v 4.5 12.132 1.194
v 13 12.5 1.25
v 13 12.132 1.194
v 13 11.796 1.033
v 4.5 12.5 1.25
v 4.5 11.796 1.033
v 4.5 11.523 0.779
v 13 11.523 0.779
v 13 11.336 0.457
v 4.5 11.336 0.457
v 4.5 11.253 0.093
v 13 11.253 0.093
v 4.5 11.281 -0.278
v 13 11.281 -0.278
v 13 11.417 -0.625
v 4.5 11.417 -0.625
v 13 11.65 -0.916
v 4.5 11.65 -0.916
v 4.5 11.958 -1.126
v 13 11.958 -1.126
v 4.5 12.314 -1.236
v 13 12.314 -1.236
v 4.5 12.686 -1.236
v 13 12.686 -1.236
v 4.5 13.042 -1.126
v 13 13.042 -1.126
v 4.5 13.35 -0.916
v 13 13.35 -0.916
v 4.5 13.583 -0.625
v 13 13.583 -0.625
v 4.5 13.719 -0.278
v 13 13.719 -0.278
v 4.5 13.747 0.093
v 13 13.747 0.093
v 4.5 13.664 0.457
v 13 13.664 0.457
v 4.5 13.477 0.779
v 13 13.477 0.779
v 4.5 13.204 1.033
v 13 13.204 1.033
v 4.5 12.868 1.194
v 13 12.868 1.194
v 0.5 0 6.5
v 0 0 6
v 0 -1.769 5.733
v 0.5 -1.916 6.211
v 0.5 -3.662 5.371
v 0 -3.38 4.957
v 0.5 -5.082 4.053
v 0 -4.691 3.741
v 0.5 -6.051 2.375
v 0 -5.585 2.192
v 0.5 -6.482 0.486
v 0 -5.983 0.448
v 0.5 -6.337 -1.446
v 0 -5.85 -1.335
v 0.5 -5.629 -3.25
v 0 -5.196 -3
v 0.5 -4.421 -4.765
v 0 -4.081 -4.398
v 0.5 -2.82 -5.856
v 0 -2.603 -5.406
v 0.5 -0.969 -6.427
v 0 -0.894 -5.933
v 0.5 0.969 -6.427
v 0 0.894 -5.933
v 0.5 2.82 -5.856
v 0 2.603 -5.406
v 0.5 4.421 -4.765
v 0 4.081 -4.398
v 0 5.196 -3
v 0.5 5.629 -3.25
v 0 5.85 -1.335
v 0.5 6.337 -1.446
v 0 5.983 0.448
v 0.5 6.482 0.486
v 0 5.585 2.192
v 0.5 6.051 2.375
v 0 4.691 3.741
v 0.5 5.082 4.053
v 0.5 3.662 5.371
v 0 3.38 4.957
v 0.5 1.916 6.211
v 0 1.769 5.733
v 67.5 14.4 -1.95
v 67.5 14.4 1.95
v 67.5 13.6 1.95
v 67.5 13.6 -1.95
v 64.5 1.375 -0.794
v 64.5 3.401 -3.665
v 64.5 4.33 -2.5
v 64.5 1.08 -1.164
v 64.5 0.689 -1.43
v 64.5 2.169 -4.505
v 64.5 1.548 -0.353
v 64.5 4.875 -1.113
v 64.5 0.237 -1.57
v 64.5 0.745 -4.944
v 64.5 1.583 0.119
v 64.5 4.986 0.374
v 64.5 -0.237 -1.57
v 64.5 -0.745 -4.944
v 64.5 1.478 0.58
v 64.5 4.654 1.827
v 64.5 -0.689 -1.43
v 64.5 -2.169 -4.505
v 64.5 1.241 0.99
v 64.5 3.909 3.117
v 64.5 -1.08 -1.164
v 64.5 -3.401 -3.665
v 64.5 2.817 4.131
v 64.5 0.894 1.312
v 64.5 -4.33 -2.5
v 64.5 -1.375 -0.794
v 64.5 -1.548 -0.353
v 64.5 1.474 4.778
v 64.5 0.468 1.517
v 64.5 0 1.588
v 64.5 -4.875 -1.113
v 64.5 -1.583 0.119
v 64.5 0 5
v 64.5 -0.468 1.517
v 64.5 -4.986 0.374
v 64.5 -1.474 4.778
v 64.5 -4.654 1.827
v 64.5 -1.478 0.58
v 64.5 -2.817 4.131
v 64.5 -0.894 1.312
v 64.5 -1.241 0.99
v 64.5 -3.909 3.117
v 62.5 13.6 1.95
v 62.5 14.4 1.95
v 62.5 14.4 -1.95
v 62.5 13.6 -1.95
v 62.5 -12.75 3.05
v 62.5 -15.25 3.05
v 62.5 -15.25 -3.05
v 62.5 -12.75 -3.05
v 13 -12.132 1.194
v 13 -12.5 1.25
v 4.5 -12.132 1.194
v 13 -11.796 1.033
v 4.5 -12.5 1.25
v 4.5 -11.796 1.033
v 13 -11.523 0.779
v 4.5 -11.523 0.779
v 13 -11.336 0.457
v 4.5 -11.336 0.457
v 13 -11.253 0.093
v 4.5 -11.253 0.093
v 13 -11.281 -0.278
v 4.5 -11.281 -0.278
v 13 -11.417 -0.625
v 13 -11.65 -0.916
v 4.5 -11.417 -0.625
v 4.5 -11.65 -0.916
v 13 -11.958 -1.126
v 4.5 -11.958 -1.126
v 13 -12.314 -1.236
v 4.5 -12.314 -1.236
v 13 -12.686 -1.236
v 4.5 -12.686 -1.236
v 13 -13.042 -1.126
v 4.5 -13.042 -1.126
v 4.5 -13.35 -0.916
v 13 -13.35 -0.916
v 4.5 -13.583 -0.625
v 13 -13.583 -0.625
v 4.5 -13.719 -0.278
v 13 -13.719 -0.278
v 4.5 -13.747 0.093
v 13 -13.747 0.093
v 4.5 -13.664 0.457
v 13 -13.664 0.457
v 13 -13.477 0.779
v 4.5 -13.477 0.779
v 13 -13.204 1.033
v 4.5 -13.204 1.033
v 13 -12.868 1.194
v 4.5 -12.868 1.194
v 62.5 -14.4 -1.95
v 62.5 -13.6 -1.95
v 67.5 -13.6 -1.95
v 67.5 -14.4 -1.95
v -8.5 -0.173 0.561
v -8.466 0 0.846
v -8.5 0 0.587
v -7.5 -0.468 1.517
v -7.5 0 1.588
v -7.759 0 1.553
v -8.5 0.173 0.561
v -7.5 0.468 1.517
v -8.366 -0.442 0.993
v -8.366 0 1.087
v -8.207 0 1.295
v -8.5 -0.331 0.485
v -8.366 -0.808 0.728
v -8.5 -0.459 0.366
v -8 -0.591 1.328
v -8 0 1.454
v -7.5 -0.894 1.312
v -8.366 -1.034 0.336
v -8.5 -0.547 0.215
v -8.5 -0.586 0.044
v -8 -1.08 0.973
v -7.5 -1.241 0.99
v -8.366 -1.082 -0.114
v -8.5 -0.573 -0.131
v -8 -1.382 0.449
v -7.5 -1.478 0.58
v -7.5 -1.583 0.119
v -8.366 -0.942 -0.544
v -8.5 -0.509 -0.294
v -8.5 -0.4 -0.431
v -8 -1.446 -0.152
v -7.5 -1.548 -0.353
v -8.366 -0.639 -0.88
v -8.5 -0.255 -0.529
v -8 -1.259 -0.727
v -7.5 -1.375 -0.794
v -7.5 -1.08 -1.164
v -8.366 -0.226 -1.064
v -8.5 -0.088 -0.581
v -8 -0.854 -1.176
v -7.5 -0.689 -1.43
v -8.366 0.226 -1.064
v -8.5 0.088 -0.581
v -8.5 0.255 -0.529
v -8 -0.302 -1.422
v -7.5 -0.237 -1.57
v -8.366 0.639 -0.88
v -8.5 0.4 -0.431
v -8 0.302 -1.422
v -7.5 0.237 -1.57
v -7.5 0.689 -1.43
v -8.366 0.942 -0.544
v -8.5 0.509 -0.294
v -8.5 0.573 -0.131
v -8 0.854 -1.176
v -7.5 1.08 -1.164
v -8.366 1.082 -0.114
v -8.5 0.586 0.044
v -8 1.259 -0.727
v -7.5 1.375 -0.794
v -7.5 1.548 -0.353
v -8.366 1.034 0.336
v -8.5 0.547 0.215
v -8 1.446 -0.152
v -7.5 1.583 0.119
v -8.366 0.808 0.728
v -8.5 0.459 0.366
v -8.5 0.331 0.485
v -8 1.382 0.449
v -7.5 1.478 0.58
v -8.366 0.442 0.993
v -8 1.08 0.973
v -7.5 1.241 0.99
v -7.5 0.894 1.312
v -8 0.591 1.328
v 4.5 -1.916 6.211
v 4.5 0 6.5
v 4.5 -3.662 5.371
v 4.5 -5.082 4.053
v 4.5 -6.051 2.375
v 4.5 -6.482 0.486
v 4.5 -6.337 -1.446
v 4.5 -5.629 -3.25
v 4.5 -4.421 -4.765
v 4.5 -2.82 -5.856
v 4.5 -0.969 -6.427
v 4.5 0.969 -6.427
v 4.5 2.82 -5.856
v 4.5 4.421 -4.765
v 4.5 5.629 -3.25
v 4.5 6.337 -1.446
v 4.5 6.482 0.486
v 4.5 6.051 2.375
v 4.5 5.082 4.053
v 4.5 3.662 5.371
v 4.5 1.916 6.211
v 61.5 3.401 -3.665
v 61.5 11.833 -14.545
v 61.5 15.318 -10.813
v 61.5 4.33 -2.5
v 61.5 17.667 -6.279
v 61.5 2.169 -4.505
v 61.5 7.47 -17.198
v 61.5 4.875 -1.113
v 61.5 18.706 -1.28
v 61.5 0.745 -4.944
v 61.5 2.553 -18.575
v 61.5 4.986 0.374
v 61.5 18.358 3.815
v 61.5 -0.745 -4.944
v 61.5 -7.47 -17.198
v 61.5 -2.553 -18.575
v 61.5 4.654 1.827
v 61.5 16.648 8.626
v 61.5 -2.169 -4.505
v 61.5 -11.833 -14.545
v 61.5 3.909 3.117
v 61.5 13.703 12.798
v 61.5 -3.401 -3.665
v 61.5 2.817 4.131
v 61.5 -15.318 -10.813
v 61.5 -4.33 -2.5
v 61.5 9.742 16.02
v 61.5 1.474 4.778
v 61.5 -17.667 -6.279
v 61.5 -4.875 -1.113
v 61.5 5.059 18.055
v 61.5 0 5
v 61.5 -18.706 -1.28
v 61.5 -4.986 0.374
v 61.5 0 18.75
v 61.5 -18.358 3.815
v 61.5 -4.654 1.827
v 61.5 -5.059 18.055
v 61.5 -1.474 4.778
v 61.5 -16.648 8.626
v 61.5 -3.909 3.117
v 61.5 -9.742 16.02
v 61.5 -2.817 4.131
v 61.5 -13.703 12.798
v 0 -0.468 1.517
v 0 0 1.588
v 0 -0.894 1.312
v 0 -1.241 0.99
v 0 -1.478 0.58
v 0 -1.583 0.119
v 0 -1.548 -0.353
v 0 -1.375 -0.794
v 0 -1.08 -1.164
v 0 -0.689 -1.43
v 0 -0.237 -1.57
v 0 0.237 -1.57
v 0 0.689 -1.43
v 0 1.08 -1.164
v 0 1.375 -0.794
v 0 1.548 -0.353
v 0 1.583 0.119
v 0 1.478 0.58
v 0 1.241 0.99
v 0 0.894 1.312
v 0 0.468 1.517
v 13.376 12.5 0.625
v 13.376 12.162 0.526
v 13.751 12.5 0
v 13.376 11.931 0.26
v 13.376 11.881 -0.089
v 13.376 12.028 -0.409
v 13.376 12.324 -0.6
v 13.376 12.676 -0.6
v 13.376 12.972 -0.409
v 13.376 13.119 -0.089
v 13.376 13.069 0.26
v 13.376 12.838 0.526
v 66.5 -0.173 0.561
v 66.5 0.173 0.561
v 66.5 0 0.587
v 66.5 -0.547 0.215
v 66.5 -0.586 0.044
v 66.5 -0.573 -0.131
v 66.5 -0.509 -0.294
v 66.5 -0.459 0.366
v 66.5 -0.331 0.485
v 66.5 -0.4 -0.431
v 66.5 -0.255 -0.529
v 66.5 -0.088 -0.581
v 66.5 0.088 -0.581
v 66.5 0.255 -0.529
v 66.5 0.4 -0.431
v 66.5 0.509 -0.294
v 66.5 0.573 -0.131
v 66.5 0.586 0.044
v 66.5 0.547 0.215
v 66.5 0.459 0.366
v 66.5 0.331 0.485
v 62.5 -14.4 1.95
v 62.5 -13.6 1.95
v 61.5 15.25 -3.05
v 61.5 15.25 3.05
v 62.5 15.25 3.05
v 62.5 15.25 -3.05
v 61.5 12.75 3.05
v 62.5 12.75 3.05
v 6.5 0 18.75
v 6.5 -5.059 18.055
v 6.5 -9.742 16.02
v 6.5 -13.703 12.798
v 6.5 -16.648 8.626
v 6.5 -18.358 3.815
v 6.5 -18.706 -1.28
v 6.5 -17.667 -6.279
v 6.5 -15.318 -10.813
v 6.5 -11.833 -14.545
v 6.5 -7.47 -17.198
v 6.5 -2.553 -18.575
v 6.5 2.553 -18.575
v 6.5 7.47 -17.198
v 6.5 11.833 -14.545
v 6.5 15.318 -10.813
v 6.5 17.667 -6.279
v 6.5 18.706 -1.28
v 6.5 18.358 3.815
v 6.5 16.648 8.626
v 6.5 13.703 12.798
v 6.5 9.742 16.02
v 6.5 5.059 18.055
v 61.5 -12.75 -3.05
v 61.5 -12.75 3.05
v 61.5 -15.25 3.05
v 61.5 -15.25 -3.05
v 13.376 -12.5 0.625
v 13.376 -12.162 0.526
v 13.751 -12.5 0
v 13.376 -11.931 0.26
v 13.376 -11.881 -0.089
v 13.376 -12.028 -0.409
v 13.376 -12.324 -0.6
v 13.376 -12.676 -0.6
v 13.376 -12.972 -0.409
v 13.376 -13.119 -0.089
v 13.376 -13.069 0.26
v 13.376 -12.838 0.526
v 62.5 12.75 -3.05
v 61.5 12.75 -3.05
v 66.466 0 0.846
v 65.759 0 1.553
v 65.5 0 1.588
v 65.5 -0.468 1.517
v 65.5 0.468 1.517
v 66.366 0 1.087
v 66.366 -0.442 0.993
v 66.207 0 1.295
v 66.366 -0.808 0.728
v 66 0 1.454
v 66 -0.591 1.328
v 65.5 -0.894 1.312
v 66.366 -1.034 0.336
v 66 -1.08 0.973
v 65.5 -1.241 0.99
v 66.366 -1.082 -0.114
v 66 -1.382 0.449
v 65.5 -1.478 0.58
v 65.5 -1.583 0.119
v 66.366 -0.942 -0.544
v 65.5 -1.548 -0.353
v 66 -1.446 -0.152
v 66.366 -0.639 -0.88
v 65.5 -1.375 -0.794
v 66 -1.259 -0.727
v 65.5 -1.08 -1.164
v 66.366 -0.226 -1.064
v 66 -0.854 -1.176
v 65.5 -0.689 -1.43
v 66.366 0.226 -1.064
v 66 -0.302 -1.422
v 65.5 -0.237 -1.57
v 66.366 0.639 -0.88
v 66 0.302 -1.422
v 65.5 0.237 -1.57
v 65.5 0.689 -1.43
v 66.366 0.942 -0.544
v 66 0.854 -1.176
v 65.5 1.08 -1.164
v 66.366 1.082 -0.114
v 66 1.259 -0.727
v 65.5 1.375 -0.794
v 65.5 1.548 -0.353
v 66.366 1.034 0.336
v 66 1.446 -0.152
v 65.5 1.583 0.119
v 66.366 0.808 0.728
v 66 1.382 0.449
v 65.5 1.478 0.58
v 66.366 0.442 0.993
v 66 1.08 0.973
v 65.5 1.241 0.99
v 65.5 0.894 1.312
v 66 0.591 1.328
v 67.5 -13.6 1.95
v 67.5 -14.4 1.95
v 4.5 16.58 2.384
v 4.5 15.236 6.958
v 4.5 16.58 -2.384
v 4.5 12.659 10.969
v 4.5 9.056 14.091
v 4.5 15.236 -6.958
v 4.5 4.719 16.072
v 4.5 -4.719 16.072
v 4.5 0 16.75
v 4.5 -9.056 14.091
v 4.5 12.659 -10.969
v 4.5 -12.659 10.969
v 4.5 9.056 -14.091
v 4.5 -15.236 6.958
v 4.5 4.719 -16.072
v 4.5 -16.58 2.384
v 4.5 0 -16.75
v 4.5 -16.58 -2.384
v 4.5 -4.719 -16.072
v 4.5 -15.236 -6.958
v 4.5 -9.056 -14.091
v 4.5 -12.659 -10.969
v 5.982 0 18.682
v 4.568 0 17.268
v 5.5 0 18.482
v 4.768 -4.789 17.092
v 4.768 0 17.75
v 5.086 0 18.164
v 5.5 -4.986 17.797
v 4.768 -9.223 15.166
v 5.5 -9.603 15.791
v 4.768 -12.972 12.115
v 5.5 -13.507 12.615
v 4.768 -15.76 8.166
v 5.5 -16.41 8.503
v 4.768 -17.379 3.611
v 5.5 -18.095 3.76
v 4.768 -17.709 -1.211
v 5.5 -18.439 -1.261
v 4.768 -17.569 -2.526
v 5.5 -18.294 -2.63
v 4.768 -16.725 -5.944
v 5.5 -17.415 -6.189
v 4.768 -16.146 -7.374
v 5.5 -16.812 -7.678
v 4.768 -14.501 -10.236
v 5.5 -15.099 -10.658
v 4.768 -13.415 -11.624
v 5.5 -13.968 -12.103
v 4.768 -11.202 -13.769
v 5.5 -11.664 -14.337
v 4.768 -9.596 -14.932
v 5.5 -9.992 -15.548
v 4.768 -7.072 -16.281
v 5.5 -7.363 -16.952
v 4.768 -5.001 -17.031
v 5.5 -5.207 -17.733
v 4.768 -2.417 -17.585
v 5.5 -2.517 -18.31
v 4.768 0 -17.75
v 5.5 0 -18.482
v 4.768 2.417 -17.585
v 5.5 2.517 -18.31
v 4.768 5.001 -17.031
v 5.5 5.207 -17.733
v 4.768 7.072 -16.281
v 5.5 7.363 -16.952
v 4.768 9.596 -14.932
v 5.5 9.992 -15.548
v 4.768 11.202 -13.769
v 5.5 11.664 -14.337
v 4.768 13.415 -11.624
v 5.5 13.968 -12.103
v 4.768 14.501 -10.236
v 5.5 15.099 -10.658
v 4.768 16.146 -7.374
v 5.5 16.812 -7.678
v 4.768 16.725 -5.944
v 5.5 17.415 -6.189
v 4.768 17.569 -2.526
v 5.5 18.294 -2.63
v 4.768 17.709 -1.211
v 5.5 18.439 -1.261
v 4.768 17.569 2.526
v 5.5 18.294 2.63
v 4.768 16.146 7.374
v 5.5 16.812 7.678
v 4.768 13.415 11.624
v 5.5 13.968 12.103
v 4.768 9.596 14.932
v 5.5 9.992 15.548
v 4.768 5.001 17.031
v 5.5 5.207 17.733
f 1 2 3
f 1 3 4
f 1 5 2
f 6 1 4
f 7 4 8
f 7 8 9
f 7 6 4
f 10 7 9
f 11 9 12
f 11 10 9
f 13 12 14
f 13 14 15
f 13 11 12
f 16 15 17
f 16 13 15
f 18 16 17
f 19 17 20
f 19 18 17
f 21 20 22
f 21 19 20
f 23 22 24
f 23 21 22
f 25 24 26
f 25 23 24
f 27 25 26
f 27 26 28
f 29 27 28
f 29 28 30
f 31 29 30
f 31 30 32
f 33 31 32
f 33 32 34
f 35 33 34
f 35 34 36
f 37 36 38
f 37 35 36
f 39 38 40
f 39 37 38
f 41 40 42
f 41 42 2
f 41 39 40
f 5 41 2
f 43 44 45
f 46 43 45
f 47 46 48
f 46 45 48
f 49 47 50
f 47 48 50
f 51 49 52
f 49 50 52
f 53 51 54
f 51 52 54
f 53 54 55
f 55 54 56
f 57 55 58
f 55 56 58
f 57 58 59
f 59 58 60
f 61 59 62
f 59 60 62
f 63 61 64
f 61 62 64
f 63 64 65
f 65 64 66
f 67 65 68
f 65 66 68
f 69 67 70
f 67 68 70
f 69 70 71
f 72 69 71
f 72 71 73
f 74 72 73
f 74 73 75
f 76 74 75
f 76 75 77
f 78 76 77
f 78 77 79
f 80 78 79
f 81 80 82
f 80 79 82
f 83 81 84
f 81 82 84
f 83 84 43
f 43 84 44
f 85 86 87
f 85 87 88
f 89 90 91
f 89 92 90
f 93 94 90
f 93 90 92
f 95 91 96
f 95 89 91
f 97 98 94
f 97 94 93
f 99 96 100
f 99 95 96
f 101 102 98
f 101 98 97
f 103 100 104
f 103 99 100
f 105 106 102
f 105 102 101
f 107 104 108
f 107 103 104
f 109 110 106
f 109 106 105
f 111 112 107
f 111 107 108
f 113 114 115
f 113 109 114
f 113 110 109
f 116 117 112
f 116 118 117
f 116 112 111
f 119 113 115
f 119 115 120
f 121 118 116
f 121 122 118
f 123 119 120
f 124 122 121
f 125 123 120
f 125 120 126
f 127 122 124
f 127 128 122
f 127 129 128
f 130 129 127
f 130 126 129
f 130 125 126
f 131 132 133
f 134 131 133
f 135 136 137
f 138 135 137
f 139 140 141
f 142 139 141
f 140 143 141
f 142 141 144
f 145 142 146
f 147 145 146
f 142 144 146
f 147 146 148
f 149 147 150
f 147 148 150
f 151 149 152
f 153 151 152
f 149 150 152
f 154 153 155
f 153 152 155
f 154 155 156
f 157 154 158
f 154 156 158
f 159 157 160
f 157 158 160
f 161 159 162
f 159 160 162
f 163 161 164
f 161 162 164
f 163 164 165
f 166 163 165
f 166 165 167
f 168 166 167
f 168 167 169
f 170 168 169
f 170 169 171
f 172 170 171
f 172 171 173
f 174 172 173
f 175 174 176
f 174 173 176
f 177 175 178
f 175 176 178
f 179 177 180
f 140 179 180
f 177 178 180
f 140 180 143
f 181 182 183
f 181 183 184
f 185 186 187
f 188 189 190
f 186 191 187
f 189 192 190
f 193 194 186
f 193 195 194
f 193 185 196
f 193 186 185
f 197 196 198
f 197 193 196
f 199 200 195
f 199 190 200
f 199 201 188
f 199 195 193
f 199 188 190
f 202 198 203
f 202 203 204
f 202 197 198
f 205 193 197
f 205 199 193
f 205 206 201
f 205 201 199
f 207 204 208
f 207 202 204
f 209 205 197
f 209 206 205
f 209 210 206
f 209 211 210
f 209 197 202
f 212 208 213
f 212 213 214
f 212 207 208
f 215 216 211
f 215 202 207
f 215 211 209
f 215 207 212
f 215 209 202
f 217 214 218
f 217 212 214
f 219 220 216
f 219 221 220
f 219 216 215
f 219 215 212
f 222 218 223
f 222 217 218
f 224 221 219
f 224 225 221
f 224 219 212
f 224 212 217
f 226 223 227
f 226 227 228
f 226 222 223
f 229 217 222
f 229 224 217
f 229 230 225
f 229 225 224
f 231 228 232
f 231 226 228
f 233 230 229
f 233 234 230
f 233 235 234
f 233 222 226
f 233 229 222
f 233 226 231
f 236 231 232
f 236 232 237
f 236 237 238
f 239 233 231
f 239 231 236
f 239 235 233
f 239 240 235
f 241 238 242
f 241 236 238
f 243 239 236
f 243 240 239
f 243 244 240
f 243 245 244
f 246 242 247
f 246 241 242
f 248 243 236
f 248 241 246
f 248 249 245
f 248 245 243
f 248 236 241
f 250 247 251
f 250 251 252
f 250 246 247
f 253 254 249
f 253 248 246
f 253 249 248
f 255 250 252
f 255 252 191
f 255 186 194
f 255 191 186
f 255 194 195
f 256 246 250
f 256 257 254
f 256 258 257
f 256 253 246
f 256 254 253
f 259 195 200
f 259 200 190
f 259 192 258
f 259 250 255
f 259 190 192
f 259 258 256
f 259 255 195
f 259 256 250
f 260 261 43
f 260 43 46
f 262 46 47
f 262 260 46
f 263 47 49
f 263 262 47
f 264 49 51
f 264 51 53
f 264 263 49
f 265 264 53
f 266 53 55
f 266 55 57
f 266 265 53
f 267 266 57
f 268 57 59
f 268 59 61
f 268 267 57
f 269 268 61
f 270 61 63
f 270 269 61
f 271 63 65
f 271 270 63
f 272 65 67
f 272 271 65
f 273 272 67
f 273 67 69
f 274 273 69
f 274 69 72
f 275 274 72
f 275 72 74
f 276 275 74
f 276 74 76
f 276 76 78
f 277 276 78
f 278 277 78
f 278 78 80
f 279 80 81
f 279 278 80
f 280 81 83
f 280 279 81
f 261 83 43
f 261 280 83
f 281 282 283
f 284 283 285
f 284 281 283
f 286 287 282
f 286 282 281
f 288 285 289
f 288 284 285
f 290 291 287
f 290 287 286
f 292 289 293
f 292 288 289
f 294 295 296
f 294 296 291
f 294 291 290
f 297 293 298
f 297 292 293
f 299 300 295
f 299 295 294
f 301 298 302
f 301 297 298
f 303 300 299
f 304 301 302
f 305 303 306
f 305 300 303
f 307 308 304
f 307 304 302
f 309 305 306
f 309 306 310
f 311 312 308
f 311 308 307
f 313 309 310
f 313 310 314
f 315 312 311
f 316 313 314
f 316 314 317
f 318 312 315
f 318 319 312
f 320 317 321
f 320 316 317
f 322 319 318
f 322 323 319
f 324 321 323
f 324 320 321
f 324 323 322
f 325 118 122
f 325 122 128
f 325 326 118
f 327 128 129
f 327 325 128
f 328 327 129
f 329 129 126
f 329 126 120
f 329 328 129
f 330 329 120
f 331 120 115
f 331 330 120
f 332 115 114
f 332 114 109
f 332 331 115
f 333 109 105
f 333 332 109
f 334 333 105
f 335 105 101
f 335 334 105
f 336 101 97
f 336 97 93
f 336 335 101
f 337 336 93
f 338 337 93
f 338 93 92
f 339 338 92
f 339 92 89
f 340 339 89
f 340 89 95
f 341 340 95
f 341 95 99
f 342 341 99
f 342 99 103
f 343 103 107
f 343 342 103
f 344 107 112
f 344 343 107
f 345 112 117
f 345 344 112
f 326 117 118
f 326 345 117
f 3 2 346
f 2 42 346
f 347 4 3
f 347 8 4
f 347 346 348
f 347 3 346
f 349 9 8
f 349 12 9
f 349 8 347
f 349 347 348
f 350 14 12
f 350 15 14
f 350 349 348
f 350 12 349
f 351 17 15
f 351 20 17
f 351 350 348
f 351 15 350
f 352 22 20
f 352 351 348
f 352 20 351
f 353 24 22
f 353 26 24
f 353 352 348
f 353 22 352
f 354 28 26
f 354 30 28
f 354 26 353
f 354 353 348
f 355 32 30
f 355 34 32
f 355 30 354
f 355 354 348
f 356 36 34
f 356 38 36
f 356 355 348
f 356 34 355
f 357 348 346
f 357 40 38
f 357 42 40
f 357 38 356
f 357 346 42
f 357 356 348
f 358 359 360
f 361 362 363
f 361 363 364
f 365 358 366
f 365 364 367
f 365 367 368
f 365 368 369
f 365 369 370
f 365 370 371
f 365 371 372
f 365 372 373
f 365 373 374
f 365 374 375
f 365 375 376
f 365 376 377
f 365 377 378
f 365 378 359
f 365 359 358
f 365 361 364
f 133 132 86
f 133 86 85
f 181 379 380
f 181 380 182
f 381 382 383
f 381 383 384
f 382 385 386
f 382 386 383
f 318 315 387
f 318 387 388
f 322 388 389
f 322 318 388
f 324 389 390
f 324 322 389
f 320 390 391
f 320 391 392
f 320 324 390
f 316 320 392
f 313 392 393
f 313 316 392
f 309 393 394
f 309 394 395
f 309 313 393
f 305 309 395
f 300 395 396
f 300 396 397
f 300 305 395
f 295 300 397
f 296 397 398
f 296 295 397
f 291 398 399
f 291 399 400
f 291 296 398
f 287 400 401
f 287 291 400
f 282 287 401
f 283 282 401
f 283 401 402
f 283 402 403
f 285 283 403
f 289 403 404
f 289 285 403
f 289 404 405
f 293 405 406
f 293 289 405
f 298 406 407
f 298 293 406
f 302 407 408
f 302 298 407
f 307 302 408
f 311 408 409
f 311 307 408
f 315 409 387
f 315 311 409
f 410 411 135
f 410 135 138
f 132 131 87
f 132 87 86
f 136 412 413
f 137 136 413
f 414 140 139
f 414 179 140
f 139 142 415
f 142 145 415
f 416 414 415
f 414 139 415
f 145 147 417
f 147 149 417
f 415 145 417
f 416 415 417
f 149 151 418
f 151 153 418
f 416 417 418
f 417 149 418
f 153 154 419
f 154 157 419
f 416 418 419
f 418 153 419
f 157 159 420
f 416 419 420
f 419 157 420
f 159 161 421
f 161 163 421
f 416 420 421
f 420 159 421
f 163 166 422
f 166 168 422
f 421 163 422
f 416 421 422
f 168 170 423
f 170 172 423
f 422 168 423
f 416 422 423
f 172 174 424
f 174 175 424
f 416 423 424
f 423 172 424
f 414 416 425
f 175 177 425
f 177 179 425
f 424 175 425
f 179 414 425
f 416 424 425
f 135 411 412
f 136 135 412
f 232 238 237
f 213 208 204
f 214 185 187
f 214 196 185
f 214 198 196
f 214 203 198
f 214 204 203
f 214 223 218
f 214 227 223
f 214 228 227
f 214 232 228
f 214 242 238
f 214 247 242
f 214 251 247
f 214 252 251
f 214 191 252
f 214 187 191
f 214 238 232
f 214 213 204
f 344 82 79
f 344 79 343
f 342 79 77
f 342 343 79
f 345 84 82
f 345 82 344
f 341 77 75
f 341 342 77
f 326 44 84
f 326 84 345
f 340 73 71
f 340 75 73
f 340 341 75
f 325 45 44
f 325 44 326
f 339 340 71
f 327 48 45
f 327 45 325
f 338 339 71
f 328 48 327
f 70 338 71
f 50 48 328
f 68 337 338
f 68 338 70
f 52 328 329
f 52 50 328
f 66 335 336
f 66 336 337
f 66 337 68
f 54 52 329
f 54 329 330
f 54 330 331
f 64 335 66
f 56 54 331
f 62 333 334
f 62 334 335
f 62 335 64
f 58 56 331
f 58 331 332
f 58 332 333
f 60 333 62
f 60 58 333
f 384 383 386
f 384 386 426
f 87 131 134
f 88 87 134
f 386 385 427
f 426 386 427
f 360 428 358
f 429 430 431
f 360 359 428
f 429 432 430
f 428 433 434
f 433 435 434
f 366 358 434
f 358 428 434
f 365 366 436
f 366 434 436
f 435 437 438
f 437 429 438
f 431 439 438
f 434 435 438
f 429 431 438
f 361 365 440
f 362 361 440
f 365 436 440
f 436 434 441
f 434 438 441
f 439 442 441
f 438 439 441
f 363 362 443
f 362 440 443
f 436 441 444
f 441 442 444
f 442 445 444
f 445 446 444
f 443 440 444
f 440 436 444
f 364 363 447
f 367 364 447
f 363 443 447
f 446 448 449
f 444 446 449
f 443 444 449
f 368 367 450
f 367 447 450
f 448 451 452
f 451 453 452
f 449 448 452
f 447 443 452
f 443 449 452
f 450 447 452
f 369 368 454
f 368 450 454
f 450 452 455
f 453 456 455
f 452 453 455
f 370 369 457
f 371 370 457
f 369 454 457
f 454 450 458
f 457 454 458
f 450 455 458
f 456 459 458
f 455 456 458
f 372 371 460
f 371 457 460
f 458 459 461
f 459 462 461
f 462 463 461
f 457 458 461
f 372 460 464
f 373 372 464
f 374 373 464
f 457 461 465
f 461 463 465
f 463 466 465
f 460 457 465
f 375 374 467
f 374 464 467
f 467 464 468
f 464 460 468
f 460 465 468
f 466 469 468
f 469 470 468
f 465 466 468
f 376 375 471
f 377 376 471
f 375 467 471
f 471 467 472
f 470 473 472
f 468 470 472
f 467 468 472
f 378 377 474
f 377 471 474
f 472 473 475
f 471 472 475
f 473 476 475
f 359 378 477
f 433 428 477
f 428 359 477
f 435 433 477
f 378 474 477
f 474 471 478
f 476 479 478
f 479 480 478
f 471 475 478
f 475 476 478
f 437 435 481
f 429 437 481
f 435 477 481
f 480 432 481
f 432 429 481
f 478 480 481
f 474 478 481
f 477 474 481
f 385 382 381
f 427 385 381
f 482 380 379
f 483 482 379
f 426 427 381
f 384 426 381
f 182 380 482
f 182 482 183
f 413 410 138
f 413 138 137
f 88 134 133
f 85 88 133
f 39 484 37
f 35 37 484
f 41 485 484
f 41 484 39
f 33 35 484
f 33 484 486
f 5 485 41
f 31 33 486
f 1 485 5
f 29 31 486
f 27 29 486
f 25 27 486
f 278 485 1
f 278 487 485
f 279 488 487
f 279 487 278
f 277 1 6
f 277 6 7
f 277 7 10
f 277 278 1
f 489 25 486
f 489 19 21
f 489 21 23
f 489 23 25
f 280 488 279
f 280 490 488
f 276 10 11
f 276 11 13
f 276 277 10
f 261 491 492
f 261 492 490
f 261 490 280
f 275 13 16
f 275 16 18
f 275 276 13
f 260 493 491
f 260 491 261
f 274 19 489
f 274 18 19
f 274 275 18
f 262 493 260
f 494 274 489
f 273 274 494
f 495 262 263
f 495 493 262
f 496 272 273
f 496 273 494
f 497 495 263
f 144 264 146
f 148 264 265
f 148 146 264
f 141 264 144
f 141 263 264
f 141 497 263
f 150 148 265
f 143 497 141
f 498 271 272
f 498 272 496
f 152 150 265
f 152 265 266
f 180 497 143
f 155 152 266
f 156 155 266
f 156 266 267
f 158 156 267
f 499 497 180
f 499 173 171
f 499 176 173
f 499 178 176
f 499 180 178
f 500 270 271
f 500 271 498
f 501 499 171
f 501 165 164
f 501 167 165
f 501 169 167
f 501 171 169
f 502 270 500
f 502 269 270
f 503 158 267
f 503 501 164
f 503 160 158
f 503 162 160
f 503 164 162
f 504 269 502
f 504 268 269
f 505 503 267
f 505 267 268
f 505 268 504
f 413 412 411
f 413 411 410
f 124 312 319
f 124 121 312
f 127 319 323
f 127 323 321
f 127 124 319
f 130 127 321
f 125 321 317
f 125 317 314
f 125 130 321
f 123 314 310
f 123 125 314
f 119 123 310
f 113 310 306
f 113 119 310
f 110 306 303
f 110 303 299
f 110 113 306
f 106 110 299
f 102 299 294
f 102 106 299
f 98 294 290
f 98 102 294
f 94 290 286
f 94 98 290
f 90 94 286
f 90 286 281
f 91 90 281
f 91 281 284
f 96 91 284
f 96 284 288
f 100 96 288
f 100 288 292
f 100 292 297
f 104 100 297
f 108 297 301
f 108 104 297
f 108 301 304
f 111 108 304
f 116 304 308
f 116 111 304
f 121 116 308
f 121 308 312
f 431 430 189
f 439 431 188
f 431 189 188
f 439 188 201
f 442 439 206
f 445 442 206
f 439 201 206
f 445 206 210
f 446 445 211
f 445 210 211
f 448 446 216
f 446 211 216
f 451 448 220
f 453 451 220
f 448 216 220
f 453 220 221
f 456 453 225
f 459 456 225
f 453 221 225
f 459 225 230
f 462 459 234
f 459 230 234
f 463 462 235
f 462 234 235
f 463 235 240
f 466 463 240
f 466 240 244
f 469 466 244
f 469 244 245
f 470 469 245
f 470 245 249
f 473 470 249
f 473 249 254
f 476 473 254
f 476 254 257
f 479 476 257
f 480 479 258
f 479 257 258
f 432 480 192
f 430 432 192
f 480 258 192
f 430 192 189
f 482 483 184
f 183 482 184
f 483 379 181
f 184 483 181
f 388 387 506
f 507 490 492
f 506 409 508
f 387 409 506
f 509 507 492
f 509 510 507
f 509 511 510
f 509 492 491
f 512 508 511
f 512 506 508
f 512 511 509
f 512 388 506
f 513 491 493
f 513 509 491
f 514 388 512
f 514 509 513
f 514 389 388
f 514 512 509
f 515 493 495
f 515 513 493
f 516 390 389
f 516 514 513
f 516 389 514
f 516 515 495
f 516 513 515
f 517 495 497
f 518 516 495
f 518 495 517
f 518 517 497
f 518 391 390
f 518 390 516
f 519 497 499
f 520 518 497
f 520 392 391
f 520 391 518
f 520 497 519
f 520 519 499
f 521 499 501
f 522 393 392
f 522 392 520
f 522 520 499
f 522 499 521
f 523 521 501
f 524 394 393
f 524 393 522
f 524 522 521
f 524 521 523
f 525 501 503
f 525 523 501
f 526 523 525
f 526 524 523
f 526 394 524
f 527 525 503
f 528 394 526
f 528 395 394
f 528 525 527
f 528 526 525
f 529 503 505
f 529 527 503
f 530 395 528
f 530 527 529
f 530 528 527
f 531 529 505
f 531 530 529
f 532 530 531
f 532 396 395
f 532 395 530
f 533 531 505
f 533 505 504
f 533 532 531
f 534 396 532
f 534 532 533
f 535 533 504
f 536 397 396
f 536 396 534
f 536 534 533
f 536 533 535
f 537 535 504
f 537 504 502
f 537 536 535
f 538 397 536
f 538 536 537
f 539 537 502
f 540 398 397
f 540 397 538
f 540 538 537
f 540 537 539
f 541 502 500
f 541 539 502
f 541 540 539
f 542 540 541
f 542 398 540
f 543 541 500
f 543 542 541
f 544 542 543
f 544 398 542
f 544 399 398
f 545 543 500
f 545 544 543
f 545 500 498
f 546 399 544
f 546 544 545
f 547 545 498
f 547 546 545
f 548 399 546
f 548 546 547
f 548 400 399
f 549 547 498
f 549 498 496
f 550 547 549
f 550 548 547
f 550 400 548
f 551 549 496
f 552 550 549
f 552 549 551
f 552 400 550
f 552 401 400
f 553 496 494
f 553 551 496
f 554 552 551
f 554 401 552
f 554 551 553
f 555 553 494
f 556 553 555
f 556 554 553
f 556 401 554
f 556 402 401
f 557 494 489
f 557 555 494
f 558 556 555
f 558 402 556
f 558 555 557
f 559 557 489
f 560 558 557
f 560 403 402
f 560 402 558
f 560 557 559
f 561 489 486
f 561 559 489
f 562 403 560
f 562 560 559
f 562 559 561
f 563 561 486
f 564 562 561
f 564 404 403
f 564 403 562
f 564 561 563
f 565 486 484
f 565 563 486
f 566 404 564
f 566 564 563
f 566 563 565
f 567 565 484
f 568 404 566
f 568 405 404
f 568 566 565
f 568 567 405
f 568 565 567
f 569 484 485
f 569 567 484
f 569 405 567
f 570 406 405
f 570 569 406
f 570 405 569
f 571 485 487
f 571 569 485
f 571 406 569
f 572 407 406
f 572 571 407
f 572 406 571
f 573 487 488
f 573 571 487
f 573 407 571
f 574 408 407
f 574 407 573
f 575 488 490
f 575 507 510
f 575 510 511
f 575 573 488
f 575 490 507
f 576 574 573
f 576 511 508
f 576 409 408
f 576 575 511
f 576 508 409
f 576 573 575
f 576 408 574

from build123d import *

# Parameters (mm, degrees)
VERRUNDUNG1_R                   = 1
VERRUNDUNG2_R                   = 2
FASE1_SIZE                      = 0.5
SKIZZE5_W                       = 6.1
SKIZZE5_H                       = 2.5
AUFSATZ_LINEAR_AUSTRAGEN1_DEPTH = 1
SKIZZE6_W                       = 3.9
SKIZZE6_H                       = 0.8
AUFSATZ_LINEAR_AUSTRAGEN2_DEPTH = 5


with BuildPart() as part:
    # Skizze3 → Rotation1 (revolve)
    with BuildSketch(Plane.XY, mode=Mode.PRIVATE) as rotation1_sk:
        Polygon((66.5, 1.5875), (66.5, 0), (0, 0), (-8.5, 0), (-8.5, 1.5875), (0, 1.5875), (64.5, 1.5875), align=None)
    revolve(rotation1_sk.sketch.rotate(Axis((0, 0, 0), (1, 0, 0)), 90), axis=Axis((0, 0, 0), (1, 0, 0)))

    # Verrundung1
    verrundung1_edges = [part.edges().sort_by_distance(p)[0] for p in [
        (-8.5, 0, -1.5875),
        (66.5, 0, -1.5875),
    ]]
    fillet(verrundung1_edges, radius=VERRUNDUNG1_R)


with BuildPart() as body_2:
    # Skizze4 → Rotation2 (revolve)
    with BuildSketch(Plane.XY, mode=Mode.PRIVATE) as rotation2_sk:
        Polygon((64.5, 1.5875), (0, 1.5875), (0, 6.5), (4.5, 6.5), (4.5, 18.75), (61.5, 18.75), (61.5, 5), (64.5, 5), align=None)
    revolve(rotation2_sk.sketch.rotate(Axis((0, 0, 0), (1, 0, 0)), 90), axis=Axis((0, 0, 0), (1, 0, 0)))

    # Skizze8 → M3 Gewindebohrung1 (revolve, cut)
    with BuildSketch(Plane(origin=(4.5, 12.5, 0), x_dir=(0, 0, 1), z_dir=(0, 1, 0))):
        Polygon((0, 0), (0, 9.251075774), (1.25, 8.5), (1.25, 0), align=None)
    m3_gewindebohrung1 = revolve(axis=Axis((-1.85, 12.5, 0), (1, 0, 0)), mode=Mode.SUBTRACT)

    # Verrundung2
    verrundung2_edges = [body_2.edges().sort_by_distance(p)[0] for p in [
        (4.5, 0, -18.75),
    ]]
    fillet(verrundung2_edges, radius=VERRUNDUNG2_R)

    # Fase1
    fase1_edges = [body_2.edges().sort_by_distance(p)[0] for p in [
        (0, 0, -6.5),
    ]]
    chamfer(fase1_edges, length=FASE1_SIZE)

    # Spiegeln1: M3 Gewindebohrung1 across plane
    add(m3_gewindebohrung1.mirror(Plane.ZX), mode=Mode.SUBTRACT)


with BuildPart() as body_3:
    # Skizze5 → Aufsatz-Linear austragen1 (new body)
    with BuildSketch(Plane(origin=(61.5, 0, 0), x_dir=(0, 0, -1), z_dir=(1, 0, 0))):
        with Locations((0, 14)):
            Rectangle(SKIZZE5_W, SKIZZE5_H)
    extrude(amount=AUFSATZ_LINEAR_AUSTRAGEN1_DEPTH)


with BuildPart() as body_4:
    # Skizze6 → Aufsatz-Linear austragen2 (new body)
    with BuildSketch(Plane(origin=(62.5, 0, 0), x_dir=(0, 0, -1), z_dir=(1, 0, 0))):
        with Locations((0, 14)):
            Rectangle(SKIZZE6_W, SKIZZE6_H)
    extrude(amount=AUFSATZ_LINEAR_AUSTRAGEN2_DEPTH)


with BuildPart() as body_5:
    # Spiegeln5: mirrored copy
    add(body_3.part.mirror(Plane.ZX))


with BuildPart() as body_6:
    # Spiegeln5 2: mirrored copy
    add(body_4.part.mirror(Plane.ZX))


solid = Compound([part.part, body_2.part, body_3.part, body_4.part, body_5.part, body_6.part])
